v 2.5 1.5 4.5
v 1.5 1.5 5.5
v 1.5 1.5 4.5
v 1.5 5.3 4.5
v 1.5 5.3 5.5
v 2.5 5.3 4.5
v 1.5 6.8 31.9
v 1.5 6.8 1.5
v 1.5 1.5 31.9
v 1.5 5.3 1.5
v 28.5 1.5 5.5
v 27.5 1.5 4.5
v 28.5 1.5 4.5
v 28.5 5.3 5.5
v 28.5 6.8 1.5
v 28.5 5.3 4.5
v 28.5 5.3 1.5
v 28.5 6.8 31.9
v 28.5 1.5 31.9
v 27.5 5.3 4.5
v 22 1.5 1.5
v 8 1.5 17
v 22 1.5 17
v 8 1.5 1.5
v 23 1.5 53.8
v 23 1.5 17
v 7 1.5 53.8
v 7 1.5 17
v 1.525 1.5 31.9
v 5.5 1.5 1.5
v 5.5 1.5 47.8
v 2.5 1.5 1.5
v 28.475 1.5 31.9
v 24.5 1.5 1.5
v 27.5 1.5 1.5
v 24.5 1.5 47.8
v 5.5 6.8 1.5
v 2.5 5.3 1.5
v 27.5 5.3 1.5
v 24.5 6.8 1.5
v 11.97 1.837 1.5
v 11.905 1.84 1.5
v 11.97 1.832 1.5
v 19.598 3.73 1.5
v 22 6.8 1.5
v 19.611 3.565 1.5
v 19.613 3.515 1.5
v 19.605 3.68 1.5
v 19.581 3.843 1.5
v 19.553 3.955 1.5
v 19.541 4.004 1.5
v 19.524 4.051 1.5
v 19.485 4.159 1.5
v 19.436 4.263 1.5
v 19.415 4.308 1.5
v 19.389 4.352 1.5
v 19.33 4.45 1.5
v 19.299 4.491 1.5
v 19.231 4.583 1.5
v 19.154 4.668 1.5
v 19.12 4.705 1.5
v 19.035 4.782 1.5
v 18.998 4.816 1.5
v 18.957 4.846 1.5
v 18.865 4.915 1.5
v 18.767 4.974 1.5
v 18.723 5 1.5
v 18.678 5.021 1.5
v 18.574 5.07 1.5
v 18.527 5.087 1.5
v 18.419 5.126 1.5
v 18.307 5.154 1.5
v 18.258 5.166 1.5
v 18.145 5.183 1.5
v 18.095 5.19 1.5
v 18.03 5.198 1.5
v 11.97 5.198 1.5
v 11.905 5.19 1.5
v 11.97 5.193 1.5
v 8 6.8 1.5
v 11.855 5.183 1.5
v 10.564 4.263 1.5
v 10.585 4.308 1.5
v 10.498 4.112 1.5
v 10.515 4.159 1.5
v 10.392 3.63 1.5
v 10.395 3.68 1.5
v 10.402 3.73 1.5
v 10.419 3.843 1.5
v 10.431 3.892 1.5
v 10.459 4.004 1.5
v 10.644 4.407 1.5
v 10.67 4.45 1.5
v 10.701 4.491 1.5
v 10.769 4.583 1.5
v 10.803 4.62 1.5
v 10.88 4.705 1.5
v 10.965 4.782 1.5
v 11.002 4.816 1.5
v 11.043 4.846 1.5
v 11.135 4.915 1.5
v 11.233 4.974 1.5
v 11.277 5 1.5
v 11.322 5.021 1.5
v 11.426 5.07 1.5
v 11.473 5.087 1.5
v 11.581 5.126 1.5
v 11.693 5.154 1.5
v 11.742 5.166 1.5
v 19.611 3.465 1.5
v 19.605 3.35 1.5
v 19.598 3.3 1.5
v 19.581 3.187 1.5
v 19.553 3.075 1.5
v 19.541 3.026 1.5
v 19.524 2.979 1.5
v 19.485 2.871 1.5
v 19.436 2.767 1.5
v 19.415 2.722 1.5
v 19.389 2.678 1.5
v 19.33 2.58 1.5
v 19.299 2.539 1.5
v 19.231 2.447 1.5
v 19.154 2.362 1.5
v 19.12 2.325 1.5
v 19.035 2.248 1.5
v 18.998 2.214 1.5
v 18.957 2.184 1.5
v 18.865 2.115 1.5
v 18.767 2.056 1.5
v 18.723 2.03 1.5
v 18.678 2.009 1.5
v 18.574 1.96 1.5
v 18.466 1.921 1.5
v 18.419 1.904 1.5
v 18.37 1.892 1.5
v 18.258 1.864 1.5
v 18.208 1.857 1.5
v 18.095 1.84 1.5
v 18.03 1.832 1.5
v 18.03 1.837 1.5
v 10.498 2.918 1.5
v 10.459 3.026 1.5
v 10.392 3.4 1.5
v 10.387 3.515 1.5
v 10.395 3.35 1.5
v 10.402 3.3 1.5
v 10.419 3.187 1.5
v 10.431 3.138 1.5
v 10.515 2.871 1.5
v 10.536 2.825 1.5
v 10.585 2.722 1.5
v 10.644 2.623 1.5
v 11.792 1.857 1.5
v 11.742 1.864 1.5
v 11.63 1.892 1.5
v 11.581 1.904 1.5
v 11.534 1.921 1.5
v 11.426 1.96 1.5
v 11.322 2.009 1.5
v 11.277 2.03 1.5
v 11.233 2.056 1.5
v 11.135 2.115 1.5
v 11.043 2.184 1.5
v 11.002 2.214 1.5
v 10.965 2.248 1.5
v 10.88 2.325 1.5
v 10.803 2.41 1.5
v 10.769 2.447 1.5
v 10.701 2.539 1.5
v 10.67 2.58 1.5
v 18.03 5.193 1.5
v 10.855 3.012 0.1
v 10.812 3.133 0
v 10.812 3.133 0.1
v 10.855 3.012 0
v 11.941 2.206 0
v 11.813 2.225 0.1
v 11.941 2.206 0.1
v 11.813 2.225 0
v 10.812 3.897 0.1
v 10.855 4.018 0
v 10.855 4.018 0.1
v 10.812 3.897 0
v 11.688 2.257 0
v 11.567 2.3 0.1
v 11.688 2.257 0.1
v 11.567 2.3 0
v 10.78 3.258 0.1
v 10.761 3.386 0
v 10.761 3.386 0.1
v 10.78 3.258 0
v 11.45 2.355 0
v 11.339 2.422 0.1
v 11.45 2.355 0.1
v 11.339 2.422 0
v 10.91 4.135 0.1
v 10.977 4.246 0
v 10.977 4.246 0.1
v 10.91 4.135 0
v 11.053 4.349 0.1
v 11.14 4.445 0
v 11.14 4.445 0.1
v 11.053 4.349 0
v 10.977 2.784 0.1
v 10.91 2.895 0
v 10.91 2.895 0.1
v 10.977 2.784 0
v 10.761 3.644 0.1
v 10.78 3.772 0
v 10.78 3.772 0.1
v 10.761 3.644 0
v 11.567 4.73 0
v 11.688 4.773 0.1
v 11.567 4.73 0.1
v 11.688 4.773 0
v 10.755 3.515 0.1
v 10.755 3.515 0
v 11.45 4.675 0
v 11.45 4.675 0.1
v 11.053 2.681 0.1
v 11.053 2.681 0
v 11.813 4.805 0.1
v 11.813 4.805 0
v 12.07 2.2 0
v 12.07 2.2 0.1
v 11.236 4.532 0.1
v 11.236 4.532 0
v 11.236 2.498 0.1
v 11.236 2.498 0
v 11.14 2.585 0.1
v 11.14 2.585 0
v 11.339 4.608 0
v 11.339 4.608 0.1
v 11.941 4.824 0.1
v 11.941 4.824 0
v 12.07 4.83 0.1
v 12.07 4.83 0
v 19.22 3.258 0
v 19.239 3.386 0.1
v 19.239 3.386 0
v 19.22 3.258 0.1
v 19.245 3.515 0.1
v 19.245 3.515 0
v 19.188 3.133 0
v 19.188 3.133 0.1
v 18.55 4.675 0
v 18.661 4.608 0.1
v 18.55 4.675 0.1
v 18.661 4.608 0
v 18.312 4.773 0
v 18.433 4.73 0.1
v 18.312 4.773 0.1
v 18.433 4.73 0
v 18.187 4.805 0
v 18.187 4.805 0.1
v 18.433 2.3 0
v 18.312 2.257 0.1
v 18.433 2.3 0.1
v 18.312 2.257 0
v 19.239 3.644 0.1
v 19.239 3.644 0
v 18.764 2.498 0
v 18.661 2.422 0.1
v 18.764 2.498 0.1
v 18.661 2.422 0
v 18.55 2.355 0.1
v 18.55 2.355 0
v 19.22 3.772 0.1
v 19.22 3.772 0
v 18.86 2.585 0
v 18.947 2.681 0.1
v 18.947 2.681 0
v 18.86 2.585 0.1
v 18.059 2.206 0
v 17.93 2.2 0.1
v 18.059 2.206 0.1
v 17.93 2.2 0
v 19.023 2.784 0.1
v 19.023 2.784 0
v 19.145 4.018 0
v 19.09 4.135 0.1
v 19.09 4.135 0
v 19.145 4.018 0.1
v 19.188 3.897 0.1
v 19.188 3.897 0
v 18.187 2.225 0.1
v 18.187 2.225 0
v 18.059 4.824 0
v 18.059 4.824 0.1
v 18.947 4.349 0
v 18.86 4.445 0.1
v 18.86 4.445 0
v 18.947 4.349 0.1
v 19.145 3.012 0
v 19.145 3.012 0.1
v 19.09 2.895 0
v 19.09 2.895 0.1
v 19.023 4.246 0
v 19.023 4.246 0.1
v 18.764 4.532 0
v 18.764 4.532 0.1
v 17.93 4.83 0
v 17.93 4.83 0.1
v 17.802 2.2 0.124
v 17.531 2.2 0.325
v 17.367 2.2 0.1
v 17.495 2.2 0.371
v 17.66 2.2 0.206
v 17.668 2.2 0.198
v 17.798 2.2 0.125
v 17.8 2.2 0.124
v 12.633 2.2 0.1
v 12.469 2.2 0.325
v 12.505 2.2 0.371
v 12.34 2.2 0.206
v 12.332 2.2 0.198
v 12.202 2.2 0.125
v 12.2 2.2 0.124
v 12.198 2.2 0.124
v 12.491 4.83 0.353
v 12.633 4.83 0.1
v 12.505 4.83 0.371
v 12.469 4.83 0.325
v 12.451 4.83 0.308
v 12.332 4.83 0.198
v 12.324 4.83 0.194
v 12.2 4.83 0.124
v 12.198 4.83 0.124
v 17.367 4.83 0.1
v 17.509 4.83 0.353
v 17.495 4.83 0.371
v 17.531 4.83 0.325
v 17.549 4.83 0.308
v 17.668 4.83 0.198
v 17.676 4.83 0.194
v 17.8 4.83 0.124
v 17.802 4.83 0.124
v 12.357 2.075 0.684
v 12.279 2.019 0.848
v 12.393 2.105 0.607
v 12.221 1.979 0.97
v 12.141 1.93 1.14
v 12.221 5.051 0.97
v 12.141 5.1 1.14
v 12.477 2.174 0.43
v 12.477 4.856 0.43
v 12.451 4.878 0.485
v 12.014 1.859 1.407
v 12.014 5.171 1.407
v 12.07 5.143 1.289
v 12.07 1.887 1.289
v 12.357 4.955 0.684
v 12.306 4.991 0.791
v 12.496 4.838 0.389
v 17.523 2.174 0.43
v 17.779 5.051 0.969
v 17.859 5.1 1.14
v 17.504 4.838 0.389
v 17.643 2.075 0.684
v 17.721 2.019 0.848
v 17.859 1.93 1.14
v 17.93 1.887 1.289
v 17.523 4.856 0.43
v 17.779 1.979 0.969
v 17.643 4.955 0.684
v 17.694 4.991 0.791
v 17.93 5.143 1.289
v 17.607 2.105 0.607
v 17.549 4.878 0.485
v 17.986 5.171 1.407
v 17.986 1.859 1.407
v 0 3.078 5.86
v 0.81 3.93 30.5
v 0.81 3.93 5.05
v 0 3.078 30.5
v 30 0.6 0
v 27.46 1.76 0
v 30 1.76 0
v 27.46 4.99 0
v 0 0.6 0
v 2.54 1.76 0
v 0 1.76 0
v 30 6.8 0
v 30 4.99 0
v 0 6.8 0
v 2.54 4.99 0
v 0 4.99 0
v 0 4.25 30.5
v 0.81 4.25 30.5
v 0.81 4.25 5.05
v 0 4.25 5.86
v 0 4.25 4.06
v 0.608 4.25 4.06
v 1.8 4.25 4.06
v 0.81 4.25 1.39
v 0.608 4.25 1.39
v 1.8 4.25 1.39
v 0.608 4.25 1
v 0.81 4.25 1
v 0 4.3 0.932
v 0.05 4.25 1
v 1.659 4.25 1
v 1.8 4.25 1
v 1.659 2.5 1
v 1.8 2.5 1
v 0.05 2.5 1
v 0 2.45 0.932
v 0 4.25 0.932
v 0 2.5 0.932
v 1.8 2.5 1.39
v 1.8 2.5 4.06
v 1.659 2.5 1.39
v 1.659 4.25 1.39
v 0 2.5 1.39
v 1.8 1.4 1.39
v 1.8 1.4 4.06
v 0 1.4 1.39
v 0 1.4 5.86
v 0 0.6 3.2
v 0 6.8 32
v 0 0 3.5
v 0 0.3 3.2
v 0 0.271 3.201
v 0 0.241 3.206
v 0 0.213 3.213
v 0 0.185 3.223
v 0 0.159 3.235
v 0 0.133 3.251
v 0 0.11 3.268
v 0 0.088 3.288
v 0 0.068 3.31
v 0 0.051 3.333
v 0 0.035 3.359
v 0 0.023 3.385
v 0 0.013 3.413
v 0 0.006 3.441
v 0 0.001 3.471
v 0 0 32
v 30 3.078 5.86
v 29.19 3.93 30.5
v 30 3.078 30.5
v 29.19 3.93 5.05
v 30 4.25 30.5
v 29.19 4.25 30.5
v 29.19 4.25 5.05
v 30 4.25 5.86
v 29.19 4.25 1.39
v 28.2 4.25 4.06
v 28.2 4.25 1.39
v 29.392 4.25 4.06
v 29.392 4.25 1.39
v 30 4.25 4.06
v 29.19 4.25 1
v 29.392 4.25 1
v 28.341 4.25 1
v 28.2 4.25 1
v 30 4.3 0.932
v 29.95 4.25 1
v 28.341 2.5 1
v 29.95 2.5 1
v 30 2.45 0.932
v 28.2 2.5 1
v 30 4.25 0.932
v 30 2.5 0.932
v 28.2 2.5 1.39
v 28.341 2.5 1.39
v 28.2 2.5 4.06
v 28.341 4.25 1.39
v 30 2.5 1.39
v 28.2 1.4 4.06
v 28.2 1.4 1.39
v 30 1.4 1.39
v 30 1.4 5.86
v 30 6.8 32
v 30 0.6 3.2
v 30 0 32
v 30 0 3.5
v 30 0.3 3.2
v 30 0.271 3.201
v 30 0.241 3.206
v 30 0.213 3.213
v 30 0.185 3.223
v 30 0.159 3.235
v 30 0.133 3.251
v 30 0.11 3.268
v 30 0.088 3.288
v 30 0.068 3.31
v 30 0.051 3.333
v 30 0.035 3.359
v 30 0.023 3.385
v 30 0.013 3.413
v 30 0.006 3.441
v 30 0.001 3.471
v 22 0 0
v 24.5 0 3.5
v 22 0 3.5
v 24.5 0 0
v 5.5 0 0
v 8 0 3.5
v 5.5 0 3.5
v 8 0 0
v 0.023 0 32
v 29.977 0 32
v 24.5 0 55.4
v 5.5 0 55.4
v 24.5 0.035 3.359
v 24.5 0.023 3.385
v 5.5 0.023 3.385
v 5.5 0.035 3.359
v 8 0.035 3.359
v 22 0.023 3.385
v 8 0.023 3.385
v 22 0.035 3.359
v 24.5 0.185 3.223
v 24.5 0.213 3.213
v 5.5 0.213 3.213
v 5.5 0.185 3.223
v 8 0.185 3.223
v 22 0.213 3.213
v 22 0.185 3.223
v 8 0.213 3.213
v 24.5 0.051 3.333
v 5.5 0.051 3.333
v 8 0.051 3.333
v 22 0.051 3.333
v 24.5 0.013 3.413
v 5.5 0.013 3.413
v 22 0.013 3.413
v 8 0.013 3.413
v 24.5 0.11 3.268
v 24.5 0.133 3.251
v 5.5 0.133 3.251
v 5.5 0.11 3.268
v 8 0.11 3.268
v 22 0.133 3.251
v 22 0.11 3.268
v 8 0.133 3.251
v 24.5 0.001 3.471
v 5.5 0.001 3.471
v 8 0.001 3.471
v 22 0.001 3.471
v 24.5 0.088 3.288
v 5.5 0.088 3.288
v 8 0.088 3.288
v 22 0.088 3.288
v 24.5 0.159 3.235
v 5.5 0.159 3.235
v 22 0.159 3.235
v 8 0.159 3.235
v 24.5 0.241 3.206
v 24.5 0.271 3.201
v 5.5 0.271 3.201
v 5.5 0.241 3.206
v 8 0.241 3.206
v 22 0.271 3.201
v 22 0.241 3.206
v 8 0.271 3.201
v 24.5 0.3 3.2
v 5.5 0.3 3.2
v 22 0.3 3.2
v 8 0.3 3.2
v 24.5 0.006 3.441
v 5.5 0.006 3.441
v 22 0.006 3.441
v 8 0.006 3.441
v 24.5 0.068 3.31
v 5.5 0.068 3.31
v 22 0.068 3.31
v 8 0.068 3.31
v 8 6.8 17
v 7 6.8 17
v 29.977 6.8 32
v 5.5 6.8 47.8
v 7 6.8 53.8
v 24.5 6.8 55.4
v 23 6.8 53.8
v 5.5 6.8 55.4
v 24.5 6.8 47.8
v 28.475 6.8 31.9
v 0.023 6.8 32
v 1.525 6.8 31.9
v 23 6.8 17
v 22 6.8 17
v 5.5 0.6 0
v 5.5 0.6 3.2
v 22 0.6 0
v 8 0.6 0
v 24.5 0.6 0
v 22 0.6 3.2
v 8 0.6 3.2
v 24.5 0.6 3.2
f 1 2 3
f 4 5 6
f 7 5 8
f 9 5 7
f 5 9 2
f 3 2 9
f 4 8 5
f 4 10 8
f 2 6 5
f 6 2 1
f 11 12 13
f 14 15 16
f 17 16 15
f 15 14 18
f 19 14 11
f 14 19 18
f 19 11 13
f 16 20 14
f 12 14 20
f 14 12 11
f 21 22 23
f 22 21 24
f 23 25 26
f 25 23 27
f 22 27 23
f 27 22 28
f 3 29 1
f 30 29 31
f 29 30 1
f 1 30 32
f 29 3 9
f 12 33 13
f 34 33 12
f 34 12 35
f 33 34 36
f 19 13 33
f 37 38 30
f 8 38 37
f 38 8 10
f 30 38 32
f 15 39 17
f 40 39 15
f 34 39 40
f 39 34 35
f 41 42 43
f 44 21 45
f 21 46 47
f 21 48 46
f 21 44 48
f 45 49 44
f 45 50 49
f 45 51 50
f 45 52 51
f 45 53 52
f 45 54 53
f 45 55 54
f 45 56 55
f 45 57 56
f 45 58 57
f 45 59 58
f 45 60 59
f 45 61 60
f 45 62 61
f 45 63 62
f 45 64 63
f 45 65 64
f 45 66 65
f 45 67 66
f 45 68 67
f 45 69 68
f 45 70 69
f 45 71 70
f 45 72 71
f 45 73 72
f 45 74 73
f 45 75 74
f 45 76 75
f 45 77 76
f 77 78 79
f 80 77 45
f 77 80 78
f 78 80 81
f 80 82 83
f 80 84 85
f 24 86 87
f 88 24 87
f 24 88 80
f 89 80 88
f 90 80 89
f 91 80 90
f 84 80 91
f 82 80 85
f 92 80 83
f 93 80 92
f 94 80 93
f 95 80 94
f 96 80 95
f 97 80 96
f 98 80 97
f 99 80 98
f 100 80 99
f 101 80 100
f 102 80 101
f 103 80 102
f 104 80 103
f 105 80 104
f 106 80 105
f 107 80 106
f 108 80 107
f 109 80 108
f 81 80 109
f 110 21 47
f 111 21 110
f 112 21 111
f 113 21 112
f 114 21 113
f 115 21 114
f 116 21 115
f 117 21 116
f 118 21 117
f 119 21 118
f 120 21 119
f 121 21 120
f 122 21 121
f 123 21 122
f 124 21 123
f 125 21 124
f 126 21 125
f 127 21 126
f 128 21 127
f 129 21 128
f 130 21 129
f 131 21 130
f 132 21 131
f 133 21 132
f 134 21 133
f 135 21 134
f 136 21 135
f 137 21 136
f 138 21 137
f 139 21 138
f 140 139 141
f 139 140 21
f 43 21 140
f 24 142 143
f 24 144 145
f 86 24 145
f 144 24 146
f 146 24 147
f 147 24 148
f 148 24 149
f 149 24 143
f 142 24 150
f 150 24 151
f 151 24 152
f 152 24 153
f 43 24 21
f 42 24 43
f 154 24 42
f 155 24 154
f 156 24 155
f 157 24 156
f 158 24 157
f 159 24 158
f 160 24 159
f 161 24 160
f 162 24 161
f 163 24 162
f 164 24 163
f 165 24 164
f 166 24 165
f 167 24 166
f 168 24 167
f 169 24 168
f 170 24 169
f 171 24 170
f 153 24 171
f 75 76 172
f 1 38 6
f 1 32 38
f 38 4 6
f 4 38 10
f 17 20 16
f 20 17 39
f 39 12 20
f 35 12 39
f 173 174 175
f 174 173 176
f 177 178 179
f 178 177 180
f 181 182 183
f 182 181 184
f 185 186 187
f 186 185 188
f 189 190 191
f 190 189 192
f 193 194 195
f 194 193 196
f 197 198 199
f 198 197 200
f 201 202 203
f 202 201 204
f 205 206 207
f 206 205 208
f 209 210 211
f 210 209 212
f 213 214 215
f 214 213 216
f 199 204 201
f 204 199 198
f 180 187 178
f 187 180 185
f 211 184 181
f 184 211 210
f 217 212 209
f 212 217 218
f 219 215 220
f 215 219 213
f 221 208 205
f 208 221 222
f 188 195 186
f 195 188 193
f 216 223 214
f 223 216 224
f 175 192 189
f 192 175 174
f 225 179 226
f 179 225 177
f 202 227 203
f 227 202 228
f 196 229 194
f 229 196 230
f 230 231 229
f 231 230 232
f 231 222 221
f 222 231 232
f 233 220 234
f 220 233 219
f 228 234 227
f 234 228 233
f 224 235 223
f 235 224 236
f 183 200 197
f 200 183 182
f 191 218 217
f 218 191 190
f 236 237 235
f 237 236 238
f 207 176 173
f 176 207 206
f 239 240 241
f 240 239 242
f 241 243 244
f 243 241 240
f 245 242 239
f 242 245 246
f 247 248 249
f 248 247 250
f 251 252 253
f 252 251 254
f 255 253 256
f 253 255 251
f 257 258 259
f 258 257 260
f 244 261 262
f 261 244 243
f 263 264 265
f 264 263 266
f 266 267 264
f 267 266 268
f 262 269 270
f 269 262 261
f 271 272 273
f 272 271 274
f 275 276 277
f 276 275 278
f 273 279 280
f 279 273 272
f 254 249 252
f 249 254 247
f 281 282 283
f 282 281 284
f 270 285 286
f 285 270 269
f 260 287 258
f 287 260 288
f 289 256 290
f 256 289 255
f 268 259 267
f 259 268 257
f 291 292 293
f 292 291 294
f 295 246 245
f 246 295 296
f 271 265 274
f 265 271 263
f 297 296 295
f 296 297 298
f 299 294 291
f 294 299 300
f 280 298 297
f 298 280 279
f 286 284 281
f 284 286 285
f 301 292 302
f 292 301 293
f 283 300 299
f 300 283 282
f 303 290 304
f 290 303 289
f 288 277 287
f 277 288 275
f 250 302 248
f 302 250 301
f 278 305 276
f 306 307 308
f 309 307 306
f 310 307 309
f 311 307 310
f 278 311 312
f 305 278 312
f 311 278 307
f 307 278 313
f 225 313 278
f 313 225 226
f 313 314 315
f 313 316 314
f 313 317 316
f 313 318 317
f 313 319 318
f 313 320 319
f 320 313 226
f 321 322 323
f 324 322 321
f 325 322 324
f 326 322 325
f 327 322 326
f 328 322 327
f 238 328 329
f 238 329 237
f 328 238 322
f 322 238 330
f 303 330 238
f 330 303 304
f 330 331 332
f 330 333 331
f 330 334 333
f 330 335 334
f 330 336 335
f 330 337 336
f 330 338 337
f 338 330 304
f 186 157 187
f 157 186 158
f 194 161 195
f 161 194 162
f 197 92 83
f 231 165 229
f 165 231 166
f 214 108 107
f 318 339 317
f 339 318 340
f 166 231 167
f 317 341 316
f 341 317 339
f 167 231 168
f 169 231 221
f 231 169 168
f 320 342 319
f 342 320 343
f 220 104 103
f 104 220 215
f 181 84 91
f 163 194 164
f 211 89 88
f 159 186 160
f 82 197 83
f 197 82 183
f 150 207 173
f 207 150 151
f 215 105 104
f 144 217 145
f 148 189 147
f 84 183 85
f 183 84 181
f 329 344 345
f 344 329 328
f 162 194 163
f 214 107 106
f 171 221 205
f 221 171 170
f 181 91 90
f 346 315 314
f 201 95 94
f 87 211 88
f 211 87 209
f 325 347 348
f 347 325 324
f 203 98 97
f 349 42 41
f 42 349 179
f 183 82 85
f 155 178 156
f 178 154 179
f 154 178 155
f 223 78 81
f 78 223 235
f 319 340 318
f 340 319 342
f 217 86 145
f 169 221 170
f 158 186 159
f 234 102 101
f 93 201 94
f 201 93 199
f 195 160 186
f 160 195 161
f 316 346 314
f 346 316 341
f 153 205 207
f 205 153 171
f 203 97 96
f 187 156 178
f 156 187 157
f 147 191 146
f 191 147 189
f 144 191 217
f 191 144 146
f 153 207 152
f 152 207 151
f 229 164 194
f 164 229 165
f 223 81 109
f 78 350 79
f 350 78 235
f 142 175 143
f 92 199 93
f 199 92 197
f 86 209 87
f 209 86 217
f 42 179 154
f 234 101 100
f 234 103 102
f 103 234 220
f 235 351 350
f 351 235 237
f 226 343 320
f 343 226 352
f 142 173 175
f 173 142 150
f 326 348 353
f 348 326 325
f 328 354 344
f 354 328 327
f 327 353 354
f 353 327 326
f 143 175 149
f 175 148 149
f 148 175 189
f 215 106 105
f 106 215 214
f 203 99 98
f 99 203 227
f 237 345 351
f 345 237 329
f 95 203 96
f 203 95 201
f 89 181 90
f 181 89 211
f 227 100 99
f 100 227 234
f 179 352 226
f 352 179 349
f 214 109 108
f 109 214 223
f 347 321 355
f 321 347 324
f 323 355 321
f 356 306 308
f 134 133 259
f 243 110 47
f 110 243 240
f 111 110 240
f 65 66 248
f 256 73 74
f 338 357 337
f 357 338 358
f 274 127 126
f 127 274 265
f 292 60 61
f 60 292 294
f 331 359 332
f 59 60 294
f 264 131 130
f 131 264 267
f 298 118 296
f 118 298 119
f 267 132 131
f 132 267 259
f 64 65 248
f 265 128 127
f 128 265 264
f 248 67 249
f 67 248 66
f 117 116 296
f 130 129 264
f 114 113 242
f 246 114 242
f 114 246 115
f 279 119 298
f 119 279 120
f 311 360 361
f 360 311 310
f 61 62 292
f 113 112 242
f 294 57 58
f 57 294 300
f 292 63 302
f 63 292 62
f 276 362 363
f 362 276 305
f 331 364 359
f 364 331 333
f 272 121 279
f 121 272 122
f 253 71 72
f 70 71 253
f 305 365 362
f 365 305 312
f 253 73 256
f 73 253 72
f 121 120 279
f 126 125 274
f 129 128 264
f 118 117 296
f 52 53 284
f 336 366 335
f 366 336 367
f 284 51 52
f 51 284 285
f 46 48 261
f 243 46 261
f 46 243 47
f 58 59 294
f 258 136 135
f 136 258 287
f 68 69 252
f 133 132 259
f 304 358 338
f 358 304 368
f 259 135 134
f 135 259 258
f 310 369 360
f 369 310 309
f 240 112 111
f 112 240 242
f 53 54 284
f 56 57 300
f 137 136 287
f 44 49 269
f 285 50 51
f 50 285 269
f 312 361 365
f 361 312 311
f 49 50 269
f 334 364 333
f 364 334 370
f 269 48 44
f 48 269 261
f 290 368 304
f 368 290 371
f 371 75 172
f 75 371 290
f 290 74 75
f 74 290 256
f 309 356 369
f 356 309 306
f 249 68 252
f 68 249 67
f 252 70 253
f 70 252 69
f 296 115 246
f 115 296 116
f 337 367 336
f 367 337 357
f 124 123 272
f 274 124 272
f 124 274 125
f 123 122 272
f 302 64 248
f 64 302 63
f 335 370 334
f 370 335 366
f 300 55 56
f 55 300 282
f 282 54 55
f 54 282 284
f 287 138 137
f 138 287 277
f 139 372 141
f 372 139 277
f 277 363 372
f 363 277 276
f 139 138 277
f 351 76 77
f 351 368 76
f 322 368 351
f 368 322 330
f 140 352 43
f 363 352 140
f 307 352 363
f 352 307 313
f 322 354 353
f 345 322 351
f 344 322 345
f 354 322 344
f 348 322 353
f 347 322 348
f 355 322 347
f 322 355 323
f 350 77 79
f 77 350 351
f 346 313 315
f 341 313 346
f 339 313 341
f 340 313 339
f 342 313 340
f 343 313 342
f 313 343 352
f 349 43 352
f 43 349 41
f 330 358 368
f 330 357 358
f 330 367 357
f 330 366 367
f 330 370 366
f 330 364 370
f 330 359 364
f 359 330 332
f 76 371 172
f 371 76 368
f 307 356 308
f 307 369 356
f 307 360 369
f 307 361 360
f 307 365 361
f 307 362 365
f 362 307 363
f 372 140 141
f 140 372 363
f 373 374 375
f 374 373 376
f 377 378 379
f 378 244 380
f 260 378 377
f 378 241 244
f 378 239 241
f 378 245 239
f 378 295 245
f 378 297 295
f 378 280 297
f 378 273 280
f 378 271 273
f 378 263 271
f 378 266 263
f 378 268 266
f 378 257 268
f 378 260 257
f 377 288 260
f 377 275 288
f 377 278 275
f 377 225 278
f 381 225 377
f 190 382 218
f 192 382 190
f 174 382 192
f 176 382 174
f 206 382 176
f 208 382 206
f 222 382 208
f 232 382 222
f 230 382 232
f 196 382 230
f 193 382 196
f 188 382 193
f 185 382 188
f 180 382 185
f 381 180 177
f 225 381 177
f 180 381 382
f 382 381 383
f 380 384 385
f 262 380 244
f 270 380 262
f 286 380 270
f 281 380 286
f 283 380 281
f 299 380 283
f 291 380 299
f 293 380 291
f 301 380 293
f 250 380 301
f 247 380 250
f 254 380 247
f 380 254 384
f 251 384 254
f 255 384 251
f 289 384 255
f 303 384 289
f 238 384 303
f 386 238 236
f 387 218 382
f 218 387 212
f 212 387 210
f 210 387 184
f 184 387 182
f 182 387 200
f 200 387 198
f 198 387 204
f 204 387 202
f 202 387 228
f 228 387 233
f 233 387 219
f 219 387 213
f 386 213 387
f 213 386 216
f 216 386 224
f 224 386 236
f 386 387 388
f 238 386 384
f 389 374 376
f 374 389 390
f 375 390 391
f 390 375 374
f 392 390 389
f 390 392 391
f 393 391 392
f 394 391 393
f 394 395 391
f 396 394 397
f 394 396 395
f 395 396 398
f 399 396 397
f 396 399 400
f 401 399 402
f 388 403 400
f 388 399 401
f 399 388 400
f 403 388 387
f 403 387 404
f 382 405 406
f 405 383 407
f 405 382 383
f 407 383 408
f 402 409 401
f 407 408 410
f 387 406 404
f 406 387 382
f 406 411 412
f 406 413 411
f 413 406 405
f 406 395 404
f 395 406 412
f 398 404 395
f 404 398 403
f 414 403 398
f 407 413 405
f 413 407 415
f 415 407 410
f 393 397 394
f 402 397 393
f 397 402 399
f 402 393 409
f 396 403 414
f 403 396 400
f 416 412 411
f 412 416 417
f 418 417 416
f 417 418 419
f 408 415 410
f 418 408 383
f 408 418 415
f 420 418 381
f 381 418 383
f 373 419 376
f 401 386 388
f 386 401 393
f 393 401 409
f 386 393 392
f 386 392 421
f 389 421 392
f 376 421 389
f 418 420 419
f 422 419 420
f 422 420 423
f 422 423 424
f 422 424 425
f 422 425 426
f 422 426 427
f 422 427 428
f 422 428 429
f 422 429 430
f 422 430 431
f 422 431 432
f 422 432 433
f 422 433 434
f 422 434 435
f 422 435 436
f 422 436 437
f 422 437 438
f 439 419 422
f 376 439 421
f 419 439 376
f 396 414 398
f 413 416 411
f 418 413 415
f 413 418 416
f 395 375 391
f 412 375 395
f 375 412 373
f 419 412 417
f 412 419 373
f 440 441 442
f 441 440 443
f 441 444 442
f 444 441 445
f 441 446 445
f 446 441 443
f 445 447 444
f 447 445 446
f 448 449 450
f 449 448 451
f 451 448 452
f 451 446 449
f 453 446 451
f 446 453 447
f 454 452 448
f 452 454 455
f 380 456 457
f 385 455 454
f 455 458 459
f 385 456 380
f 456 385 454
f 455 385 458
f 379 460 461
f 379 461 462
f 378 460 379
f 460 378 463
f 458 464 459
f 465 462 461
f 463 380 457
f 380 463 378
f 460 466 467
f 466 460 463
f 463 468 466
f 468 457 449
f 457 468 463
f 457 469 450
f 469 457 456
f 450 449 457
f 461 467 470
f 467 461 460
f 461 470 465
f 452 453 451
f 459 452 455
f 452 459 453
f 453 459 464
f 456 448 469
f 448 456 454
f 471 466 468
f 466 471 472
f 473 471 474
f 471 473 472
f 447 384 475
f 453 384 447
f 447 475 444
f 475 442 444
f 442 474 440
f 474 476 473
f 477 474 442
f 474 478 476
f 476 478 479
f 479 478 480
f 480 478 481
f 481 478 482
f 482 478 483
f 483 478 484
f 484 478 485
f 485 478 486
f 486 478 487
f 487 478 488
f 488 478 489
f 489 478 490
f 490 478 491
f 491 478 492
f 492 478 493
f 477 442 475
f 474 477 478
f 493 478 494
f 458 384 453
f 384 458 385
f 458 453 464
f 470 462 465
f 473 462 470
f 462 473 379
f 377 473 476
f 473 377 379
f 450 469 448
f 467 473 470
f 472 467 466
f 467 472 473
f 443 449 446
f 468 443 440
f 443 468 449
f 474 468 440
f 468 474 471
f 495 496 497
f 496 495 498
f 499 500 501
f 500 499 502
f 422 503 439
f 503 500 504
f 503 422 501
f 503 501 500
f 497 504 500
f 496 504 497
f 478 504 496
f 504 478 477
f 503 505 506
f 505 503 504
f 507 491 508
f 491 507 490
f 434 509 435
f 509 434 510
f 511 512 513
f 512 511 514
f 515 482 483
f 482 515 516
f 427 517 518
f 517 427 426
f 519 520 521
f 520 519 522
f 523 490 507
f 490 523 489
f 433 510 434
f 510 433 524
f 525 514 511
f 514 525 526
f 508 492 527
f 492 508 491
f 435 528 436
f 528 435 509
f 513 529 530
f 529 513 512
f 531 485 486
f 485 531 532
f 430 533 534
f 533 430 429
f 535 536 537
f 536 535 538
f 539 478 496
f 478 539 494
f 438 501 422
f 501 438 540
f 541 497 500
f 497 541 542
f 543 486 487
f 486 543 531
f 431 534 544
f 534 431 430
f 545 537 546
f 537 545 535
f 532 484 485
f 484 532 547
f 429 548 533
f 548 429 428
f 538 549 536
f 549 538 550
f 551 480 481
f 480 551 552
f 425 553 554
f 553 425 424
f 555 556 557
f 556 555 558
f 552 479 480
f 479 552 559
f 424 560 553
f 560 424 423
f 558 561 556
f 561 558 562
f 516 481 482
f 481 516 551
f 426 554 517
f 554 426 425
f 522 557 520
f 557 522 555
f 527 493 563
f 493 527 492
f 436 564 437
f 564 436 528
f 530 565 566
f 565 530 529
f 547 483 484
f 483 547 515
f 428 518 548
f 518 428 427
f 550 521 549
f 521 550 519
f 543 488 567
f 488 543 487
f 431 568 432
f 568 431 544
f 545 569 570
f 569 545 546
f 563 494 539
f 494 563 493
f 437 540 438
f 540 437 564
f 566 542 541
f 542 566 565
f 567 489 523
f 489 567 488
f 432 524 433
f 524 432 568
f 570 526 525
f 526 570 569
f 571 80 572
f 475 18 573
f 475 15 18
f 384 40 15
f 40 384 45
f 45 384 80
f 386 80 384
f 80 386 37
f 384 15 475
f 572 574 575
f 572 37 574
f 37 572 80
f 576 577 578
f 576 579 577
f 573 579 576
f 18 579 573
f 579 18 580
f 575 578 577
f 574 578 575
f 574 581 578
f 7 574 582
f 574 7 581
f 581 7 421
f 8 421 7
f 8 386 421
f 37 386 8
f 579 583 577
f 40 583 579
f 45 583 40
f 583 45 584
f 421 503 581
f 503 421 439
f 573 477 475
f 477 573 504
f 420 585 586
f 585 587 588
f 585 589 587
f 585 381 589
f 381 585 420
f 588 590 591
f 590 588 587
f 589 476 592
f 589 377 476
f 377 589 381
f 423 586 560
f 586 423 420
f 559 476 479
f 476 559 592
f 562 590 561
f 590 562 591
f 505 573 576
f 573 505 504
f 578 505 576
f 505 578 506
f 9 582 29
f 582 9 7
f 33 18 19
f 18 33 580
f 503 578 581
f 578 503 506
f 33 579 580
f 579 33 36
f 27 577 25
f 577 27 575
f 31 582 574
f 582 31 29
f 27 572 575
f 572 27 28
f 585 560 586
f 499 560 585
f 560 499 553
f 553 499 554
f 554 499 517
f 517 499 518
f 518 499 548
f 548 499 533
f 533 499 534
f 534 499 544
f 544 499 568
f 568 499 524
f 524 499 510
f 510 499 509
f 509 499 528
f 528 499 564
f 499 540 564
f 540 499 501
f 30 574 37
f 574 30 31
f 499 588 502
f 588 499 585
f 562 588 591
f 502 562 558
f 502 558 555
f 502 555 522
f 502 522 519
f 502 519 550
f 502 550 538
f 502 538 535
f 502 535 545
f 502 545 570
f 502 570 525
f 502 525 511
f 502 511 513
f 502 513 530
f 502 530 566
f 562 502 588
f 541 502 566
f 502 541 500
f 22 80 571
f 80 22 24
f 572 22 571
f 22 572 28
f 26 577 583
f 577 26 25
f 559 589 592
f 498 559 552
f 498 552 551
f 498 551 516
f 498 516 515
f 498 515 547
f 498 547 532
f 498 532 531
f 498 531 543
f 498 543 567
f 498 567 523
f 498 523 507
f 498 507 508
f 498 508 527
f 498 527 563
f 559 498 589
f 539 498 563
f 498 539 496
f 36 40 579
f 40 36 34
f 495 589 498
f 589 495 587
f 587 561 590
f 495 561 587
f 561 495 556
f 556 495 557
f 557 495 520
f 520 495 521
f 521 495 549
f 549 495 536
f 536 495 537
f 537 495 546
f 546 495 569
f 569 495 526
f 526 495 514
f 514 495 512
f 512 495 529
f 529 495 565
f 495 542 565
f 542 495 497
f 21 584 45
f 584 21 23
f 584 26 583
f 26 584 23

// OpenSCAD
// Parametric Expansion Card
//  An OpenSCAD implementation of a basic enclosure of an Expansion Card for
//  use with Framework products like the Framework Laptop.
//
//  See https://frame.work for more information about Framework products and
//  additional documentation around Expansion Cards.

// Parametric Expansion Card © 2021 by Nirav Patel at Framework Computer LLC
// is licensed under Attribution 4.0 International. 
// To view a copy of this license, visit http://creativecommons.org/licenses/by/4.0/

// The basic dimensions of an Expansion Card
base = [30.0, 32.0, 6.8];
// The default wall thickness
side_wall = 1.5;

// Size and location of the typical PCB
pcb_gap = 0.5;
pcb = [26.0, 30.0, 0.8];
pcb_h = 3.05;

// USB-C plug dimensions
usb_c_r = 1.315;
usb_c_w = 5.86+usb_c_r*2;
usb_c_h = 2.2;

rail_h = 4.25; // to top of rail

// Boss locations matching the other Framework Expansion Cards
boss_y = 10.5;
boss_x = 3.7;

extend = 22+side_wall;
indent = 5.5;
extra = 0.1;

// The rail cutout in the sides of the card
module rail(make_printable) {
    rail_depth = 0.81;
    rail_flat_h = 0.32;
    
    mirror([0, 1, 0]) {
        
        // The rail that holds the card
        bottom_angle = 43.54;
        difference() {
            union() {
                translate([rail_depth, 0, -rail_flat_h]) rotate([0, 180+bottom_angle, 0]) cube([2, base[1]-side_wall, 2]);
                translate([-2+rail_depth, 0, -rail_flat_h]) cube([2, base[1]-side_wall, rail_flat_h]);
            }
            translate([-5+rail_depth, 0, 0]) cube([5, base[1]-side_wall, 5]);
        }
    
        pyramid_b = 3.23*sqrt(2);
        pyramid_t = 1.75*sqrt(2);
        pyramid_h = 1.0;
        pyramid_inset = 1.3+0.5;
        pyramid_step = 3.06;
        
        // The ramps to make slotting into the latch smooth
        translate([-1.75/2+pyramid_inset, 0, -1.75/2]) rotate([-90, 0, 0]) rotate([0, 0, 45]) { 
            cylinder(r1 = pyramid_b/2, r2 = pyramid_t/2, h = pyramid_h, $fn=4);
            cylinder(r = pyramid_t/2, h = pyramid_step+pyramid_h, $fn=4);
            translate([-0.1, 0.1, 0])cylinder(r = pyramid_t/2, h = pyramid_step+pyramid_h, $fn=4);
        }
        
        latch_l = 2.67;
        latch_d = pyramid_inset;
        latch_h = 2.85;
        latch_wall = 1.39;
        
        // The pocket that the latch bar drops into, including a 45 degree cut for printability
        translate([0, latch_wall, -latch_h]) cube([latch_d, latch_l, latch_h]);
        if (make_printable) {
            translate([latch_d, latch_wall+latch_l, -latch_h]) rotate([0, 0, -180+45]) translate([0, -latch_l, 0]) cube([latch_d*2, latch_l, latch_h]);
        }
    }
}

// A simple 45 degree rib to improve printability
module rib(thickness, height) {
    translate([-thickness/2, 0, 0]) difference() {
        cube([thickness, height, height]);
        translate([-thickness/2, height, 0]) rotate([45, 0, 0]) cube([thickness*2, height*2, height*2]);
    }
}

// A simple cylinder cutout to fillet edges
module fillet(radius, length) {
    translate([length, 0, 0]) rotate([0, -90, 0]) difference() {
        cube([radius, radius, length]);
        translate([radius, radius, -1]) cylinder(h = length+2, r = radius, $fn = 64);
    }
}

// The cutout for the USB-C plug
module usb_c_cutout(open_top) {
    // The plug is "pushed in" by an extra 0.6 to account for 3d printing tolerances
    translate([-usb_c_w/2+usb_c_r, 7-10+0.6, usb_c_r]) rotate([-90, 0, 0]) union() {
        translate([0, usb_c_r, 0]) cylinder(r = usb_c_r, h = 10, $fn = 64);
        translate([usb_c_w-usb_c_r*2, usb_c_r, 0]) cylinder(r = usb_c_r, h = 10, $fn = 64);
        cube([usb_c_w-usb_c_r*2, usb_c_r*2, 10]);
        
        // Cutout for the pin side of the shell that expands out
        translate([0, usb_c_r, 0]) cylinder(r2 = usb_c_r, r1 = 3.84/2, h = 10-7.7, $fn = 64);
        translate([usb_c_w-usb_c_r*2, usb_c_r, 0]) cylinder(r2 = usb_c_r, r1 = 3.84/2, h = 10-7.7, $fn = 64);
        translate([usb_c_w/2-usb_c_r, usb_c_r, 0]) scale([1.8, 1, 1]) rotate([0, 0, 45]) cylinder(r2 = usb_c_r*sqrt(2), r1 = 3.84/2*sqrt(2), h = 10-7.7, $fn = 4);
        
        // If the card drops in from the top rather than sliding in from the front,
        // cut out a slot for the USB-C plug to drop into.
        if (open_top) {
            translate([-usb_c_r, -10+usb_c_r, 0]) cube([usb_c_w, 10, 10]);
        }
    }
}

// Quarter section of a sphere, used as a clip
module qsphere(radius = 1) {
    difference() {
        sphere(r = radius, $fn = 32);
        translate([-radius-1, -radius-1, -radius]) cube([radius*2+2, radius*2+2, radius]);
        translate([0, -radius-1, -radius-1]) cube([radius, radius*2+2, radius*2+2]);
    }
}

// The screw boss for the PCB, optionally with space for a threaded insert
module boss(radius, use_insert, make_printable) {
    difference() {
        cylinder(r = radius, h = pcb_h, $fn = 64);
        if (use_insert) {
            // Use threaded insert
            translate([0, 0, side_wall]) cylinder(r = 1.5, h = pcb_h, $fn = 64);
        } else {
            translate([0, 0, side_wall]) cylinder(r = 0.75, h = pcb_h, $fn = 64);
        }
    }
    
    // Add a rib for printability
    if (make_printable) {
        translate([0, radius-0.1, 0]) rib(1, pcb_h);
    }
}

// Incomplete implementation of a lid to use with this shell
module expansion_card_lid() {
    gap = 0.25;
    union() {
        translate([side_wall+gap, side_wall+gap, base[2]-side_wall]) cube([base[0]-side_wall*2-gap*2, base[1]-side_wall*2-gap*2, side_wall]);
        difference() {
            translate([base[0]/2-usb_c_w/2+gap, base[1]-side_wall-gap, usb_c_r+usb_c_h]) cube([usb_c_w-gap*2, side_wall+gap, base[2]-(usb_c_r+usb_c_h)]);
            translate([base[0]/2, base[1], usb_c_r+usb_c_h]) usb_c_cutout(false);
        }
    }
}

// A basic, printable Expansion Card enclosure
//  open_end - A boolean to make the end of the card that is exposed when inserted open
//  make_printable - Adds ribs to improve printability
//  pcb_mount - The method the PCB is held in with, "boss" for self-threading screws,
//            "boss_insert" for fastener with a threaded insert,
//            "clip" for a fastener-less clip, or
//            "" for no PCB mounting structure
module expansion_card_base(open_end, make_printable, pcb_mount="boss") {
    // Hollowing of the inside
    extra = 0.1;
    outer = [base[0], base[1], base[2]];
    inner = [outer[0]-side_wall*2, outer[1]-side_wall*2, outer[2]-side_wall+extra];
    boss_radius = 2.3;
    
    difference() {
        cube(outer);
        
        difference() {
            notch = 1.0;
            notch_l = 3.0;
            notch_h = 3.8;
            // The main hollow
            translate([side_wall, open_end ? -extra : side_wall, side_wall]) cube([inner[0], open_end ? inner[1]+side_wall+extra : inner[1], inner[2]]);
            // Extra wall thickness where the latch cutouts are
            translate([side_wall, inner[1]+side_wall-notch_l, side_wall+notch_h/2]) rotate([0, 0, -90]) rotate([0, 90, 0]) rib(notch_h, notch);
            translate([side_wall, inner[1]+side_wall-notch_l, side_wall]) cube([notch, notch_l, notch_h]);
            translate([inner[0]+side_wall, inner[1]+side_wall-notch_l, side_wall+notch_h/2]) rotate([0, 0, 180]) rotate([0, 90, 0]) rib(notch_h, notch);
            translate([inner[0]+side_wall-notch, inner[1]+side_wall-notch_l, side_wall]) cube([notch, notch_l, notch_h]);
        }
        
        // The rounded front edge to match the laptop
        edge_r = 0.8;
        // fillet(edge_r, outer[0]);
        
        // The USB-C plug cutout
        translate([outer[0]/2, outer[1], usb_c_r+usb_c_h]) usb_c_cutout(false);
        
        // The sliding rails
        translate([0, outer[1], rail_h]) rail(make_printable);
        translate([outer[0], outer[1], rail_h]) mirror([1, 0, 0]) rail(make_printable);
        
        // Cut out the end of what is normally the aluminum cover
        ledge_cut = 0.6;
        ledge_cut_d = 3.2;
        ledge_fillet_r = 0.3;
        
        translate([0, outer[1]-ledge_cut_d, 0]) cube([outer[0], ledge_cut_d, ledge_cut]);
        // The fillet on that cover
        translate([outer[0], outer[1]-ledge_cut_d, 0]) rotate([0, 0, 180]) fillet(ledge_cut/2, outer[0]);
    }
    
    if (pcb_mount == "boss" || pcb_mount == "boss_insert") {        
        // Add the screw bosses
        translate([boss_x, boss_y, 0]) boss(boss_radius, pcb_mount == "boss_insert", make_printable);
        translate([outer[0]-boss_x, boss_y, 0]) boss(boss_radius, pcb_mount == "boss_insert", make_printable);
    } else if (pcb_mount == "clip") {
        clip_w = 1.5;
        clip_gap = 0.5;
        translate([boss_x-boss_radius, boss_y-boss_radius, 0]) {
            cube([boss_radius*2, boss_radius*2, pcb_h]);
            if (make_printable)
                translate([boss_radius, boss_radius*2, 0]) rib(boss_radius*2, pcb_h);
            translate([0, boss_radius-clip_w, pcb_h+pcb[2]+clip_gap]) rotate([0, 0, 180]) qsphere(clip_w);
        }
        translate([outer[0]-boss_x-boss_radius, boss_y-boss_radius, 0]) {
            cube([boss_radius*2, boss_radius*2, pcb_h]);
            if (make_printable)
                translate([boss_radius, boss_radius*2, 0]) rib(boss_radius*2, pcb_h);
            translate([boss_radius*2, boss_radius-clip_w, pcb_h+pcb[2]+clip_gap]) qsphere(clip_w);
        }
    }
}

module extension() {    

    difference() {
        linear_extrude(height = base[2]) polygon(points=[[indent,0],[base[0]-indent,0],[base[0],extend],[0,extend]]);         
        translate([0,extra+side_wall,side_wall]) 
        linear_extrude(height = base[2]) 
        polygon(points=[[side_wall+indent,0],[base[0]-side_wall-indent,0],[base[0]-side_wall,extend-side_wall],[side_wall,extend-side_wall]]); 
    }
}

module inner_rib() {
    usb_indent=[1+side_wall,17,base[2]];
    union() {
        cube([side_wall,base[1]+extend-extra,base[2]]);
        translate([0,base[1]+extend-usb_indent[1]-extra,0]) cube(usb_indent);
    }
}

// Rotate into a printable orientation
rotate([-90, 0, 0]) translate([0, -base[1], 0]) union() {
    expansion_card_base(open_end = true, make_printable = true, pcb_mount="");
    translate([0,-(extend-0.1),0]) extension();
    translate([indent,-(extend-extra),0]) inner_rib();
    translate([base[0]-indent,-(extend-extra),0]) mirror([1,0,0]) inner_rib();
}
